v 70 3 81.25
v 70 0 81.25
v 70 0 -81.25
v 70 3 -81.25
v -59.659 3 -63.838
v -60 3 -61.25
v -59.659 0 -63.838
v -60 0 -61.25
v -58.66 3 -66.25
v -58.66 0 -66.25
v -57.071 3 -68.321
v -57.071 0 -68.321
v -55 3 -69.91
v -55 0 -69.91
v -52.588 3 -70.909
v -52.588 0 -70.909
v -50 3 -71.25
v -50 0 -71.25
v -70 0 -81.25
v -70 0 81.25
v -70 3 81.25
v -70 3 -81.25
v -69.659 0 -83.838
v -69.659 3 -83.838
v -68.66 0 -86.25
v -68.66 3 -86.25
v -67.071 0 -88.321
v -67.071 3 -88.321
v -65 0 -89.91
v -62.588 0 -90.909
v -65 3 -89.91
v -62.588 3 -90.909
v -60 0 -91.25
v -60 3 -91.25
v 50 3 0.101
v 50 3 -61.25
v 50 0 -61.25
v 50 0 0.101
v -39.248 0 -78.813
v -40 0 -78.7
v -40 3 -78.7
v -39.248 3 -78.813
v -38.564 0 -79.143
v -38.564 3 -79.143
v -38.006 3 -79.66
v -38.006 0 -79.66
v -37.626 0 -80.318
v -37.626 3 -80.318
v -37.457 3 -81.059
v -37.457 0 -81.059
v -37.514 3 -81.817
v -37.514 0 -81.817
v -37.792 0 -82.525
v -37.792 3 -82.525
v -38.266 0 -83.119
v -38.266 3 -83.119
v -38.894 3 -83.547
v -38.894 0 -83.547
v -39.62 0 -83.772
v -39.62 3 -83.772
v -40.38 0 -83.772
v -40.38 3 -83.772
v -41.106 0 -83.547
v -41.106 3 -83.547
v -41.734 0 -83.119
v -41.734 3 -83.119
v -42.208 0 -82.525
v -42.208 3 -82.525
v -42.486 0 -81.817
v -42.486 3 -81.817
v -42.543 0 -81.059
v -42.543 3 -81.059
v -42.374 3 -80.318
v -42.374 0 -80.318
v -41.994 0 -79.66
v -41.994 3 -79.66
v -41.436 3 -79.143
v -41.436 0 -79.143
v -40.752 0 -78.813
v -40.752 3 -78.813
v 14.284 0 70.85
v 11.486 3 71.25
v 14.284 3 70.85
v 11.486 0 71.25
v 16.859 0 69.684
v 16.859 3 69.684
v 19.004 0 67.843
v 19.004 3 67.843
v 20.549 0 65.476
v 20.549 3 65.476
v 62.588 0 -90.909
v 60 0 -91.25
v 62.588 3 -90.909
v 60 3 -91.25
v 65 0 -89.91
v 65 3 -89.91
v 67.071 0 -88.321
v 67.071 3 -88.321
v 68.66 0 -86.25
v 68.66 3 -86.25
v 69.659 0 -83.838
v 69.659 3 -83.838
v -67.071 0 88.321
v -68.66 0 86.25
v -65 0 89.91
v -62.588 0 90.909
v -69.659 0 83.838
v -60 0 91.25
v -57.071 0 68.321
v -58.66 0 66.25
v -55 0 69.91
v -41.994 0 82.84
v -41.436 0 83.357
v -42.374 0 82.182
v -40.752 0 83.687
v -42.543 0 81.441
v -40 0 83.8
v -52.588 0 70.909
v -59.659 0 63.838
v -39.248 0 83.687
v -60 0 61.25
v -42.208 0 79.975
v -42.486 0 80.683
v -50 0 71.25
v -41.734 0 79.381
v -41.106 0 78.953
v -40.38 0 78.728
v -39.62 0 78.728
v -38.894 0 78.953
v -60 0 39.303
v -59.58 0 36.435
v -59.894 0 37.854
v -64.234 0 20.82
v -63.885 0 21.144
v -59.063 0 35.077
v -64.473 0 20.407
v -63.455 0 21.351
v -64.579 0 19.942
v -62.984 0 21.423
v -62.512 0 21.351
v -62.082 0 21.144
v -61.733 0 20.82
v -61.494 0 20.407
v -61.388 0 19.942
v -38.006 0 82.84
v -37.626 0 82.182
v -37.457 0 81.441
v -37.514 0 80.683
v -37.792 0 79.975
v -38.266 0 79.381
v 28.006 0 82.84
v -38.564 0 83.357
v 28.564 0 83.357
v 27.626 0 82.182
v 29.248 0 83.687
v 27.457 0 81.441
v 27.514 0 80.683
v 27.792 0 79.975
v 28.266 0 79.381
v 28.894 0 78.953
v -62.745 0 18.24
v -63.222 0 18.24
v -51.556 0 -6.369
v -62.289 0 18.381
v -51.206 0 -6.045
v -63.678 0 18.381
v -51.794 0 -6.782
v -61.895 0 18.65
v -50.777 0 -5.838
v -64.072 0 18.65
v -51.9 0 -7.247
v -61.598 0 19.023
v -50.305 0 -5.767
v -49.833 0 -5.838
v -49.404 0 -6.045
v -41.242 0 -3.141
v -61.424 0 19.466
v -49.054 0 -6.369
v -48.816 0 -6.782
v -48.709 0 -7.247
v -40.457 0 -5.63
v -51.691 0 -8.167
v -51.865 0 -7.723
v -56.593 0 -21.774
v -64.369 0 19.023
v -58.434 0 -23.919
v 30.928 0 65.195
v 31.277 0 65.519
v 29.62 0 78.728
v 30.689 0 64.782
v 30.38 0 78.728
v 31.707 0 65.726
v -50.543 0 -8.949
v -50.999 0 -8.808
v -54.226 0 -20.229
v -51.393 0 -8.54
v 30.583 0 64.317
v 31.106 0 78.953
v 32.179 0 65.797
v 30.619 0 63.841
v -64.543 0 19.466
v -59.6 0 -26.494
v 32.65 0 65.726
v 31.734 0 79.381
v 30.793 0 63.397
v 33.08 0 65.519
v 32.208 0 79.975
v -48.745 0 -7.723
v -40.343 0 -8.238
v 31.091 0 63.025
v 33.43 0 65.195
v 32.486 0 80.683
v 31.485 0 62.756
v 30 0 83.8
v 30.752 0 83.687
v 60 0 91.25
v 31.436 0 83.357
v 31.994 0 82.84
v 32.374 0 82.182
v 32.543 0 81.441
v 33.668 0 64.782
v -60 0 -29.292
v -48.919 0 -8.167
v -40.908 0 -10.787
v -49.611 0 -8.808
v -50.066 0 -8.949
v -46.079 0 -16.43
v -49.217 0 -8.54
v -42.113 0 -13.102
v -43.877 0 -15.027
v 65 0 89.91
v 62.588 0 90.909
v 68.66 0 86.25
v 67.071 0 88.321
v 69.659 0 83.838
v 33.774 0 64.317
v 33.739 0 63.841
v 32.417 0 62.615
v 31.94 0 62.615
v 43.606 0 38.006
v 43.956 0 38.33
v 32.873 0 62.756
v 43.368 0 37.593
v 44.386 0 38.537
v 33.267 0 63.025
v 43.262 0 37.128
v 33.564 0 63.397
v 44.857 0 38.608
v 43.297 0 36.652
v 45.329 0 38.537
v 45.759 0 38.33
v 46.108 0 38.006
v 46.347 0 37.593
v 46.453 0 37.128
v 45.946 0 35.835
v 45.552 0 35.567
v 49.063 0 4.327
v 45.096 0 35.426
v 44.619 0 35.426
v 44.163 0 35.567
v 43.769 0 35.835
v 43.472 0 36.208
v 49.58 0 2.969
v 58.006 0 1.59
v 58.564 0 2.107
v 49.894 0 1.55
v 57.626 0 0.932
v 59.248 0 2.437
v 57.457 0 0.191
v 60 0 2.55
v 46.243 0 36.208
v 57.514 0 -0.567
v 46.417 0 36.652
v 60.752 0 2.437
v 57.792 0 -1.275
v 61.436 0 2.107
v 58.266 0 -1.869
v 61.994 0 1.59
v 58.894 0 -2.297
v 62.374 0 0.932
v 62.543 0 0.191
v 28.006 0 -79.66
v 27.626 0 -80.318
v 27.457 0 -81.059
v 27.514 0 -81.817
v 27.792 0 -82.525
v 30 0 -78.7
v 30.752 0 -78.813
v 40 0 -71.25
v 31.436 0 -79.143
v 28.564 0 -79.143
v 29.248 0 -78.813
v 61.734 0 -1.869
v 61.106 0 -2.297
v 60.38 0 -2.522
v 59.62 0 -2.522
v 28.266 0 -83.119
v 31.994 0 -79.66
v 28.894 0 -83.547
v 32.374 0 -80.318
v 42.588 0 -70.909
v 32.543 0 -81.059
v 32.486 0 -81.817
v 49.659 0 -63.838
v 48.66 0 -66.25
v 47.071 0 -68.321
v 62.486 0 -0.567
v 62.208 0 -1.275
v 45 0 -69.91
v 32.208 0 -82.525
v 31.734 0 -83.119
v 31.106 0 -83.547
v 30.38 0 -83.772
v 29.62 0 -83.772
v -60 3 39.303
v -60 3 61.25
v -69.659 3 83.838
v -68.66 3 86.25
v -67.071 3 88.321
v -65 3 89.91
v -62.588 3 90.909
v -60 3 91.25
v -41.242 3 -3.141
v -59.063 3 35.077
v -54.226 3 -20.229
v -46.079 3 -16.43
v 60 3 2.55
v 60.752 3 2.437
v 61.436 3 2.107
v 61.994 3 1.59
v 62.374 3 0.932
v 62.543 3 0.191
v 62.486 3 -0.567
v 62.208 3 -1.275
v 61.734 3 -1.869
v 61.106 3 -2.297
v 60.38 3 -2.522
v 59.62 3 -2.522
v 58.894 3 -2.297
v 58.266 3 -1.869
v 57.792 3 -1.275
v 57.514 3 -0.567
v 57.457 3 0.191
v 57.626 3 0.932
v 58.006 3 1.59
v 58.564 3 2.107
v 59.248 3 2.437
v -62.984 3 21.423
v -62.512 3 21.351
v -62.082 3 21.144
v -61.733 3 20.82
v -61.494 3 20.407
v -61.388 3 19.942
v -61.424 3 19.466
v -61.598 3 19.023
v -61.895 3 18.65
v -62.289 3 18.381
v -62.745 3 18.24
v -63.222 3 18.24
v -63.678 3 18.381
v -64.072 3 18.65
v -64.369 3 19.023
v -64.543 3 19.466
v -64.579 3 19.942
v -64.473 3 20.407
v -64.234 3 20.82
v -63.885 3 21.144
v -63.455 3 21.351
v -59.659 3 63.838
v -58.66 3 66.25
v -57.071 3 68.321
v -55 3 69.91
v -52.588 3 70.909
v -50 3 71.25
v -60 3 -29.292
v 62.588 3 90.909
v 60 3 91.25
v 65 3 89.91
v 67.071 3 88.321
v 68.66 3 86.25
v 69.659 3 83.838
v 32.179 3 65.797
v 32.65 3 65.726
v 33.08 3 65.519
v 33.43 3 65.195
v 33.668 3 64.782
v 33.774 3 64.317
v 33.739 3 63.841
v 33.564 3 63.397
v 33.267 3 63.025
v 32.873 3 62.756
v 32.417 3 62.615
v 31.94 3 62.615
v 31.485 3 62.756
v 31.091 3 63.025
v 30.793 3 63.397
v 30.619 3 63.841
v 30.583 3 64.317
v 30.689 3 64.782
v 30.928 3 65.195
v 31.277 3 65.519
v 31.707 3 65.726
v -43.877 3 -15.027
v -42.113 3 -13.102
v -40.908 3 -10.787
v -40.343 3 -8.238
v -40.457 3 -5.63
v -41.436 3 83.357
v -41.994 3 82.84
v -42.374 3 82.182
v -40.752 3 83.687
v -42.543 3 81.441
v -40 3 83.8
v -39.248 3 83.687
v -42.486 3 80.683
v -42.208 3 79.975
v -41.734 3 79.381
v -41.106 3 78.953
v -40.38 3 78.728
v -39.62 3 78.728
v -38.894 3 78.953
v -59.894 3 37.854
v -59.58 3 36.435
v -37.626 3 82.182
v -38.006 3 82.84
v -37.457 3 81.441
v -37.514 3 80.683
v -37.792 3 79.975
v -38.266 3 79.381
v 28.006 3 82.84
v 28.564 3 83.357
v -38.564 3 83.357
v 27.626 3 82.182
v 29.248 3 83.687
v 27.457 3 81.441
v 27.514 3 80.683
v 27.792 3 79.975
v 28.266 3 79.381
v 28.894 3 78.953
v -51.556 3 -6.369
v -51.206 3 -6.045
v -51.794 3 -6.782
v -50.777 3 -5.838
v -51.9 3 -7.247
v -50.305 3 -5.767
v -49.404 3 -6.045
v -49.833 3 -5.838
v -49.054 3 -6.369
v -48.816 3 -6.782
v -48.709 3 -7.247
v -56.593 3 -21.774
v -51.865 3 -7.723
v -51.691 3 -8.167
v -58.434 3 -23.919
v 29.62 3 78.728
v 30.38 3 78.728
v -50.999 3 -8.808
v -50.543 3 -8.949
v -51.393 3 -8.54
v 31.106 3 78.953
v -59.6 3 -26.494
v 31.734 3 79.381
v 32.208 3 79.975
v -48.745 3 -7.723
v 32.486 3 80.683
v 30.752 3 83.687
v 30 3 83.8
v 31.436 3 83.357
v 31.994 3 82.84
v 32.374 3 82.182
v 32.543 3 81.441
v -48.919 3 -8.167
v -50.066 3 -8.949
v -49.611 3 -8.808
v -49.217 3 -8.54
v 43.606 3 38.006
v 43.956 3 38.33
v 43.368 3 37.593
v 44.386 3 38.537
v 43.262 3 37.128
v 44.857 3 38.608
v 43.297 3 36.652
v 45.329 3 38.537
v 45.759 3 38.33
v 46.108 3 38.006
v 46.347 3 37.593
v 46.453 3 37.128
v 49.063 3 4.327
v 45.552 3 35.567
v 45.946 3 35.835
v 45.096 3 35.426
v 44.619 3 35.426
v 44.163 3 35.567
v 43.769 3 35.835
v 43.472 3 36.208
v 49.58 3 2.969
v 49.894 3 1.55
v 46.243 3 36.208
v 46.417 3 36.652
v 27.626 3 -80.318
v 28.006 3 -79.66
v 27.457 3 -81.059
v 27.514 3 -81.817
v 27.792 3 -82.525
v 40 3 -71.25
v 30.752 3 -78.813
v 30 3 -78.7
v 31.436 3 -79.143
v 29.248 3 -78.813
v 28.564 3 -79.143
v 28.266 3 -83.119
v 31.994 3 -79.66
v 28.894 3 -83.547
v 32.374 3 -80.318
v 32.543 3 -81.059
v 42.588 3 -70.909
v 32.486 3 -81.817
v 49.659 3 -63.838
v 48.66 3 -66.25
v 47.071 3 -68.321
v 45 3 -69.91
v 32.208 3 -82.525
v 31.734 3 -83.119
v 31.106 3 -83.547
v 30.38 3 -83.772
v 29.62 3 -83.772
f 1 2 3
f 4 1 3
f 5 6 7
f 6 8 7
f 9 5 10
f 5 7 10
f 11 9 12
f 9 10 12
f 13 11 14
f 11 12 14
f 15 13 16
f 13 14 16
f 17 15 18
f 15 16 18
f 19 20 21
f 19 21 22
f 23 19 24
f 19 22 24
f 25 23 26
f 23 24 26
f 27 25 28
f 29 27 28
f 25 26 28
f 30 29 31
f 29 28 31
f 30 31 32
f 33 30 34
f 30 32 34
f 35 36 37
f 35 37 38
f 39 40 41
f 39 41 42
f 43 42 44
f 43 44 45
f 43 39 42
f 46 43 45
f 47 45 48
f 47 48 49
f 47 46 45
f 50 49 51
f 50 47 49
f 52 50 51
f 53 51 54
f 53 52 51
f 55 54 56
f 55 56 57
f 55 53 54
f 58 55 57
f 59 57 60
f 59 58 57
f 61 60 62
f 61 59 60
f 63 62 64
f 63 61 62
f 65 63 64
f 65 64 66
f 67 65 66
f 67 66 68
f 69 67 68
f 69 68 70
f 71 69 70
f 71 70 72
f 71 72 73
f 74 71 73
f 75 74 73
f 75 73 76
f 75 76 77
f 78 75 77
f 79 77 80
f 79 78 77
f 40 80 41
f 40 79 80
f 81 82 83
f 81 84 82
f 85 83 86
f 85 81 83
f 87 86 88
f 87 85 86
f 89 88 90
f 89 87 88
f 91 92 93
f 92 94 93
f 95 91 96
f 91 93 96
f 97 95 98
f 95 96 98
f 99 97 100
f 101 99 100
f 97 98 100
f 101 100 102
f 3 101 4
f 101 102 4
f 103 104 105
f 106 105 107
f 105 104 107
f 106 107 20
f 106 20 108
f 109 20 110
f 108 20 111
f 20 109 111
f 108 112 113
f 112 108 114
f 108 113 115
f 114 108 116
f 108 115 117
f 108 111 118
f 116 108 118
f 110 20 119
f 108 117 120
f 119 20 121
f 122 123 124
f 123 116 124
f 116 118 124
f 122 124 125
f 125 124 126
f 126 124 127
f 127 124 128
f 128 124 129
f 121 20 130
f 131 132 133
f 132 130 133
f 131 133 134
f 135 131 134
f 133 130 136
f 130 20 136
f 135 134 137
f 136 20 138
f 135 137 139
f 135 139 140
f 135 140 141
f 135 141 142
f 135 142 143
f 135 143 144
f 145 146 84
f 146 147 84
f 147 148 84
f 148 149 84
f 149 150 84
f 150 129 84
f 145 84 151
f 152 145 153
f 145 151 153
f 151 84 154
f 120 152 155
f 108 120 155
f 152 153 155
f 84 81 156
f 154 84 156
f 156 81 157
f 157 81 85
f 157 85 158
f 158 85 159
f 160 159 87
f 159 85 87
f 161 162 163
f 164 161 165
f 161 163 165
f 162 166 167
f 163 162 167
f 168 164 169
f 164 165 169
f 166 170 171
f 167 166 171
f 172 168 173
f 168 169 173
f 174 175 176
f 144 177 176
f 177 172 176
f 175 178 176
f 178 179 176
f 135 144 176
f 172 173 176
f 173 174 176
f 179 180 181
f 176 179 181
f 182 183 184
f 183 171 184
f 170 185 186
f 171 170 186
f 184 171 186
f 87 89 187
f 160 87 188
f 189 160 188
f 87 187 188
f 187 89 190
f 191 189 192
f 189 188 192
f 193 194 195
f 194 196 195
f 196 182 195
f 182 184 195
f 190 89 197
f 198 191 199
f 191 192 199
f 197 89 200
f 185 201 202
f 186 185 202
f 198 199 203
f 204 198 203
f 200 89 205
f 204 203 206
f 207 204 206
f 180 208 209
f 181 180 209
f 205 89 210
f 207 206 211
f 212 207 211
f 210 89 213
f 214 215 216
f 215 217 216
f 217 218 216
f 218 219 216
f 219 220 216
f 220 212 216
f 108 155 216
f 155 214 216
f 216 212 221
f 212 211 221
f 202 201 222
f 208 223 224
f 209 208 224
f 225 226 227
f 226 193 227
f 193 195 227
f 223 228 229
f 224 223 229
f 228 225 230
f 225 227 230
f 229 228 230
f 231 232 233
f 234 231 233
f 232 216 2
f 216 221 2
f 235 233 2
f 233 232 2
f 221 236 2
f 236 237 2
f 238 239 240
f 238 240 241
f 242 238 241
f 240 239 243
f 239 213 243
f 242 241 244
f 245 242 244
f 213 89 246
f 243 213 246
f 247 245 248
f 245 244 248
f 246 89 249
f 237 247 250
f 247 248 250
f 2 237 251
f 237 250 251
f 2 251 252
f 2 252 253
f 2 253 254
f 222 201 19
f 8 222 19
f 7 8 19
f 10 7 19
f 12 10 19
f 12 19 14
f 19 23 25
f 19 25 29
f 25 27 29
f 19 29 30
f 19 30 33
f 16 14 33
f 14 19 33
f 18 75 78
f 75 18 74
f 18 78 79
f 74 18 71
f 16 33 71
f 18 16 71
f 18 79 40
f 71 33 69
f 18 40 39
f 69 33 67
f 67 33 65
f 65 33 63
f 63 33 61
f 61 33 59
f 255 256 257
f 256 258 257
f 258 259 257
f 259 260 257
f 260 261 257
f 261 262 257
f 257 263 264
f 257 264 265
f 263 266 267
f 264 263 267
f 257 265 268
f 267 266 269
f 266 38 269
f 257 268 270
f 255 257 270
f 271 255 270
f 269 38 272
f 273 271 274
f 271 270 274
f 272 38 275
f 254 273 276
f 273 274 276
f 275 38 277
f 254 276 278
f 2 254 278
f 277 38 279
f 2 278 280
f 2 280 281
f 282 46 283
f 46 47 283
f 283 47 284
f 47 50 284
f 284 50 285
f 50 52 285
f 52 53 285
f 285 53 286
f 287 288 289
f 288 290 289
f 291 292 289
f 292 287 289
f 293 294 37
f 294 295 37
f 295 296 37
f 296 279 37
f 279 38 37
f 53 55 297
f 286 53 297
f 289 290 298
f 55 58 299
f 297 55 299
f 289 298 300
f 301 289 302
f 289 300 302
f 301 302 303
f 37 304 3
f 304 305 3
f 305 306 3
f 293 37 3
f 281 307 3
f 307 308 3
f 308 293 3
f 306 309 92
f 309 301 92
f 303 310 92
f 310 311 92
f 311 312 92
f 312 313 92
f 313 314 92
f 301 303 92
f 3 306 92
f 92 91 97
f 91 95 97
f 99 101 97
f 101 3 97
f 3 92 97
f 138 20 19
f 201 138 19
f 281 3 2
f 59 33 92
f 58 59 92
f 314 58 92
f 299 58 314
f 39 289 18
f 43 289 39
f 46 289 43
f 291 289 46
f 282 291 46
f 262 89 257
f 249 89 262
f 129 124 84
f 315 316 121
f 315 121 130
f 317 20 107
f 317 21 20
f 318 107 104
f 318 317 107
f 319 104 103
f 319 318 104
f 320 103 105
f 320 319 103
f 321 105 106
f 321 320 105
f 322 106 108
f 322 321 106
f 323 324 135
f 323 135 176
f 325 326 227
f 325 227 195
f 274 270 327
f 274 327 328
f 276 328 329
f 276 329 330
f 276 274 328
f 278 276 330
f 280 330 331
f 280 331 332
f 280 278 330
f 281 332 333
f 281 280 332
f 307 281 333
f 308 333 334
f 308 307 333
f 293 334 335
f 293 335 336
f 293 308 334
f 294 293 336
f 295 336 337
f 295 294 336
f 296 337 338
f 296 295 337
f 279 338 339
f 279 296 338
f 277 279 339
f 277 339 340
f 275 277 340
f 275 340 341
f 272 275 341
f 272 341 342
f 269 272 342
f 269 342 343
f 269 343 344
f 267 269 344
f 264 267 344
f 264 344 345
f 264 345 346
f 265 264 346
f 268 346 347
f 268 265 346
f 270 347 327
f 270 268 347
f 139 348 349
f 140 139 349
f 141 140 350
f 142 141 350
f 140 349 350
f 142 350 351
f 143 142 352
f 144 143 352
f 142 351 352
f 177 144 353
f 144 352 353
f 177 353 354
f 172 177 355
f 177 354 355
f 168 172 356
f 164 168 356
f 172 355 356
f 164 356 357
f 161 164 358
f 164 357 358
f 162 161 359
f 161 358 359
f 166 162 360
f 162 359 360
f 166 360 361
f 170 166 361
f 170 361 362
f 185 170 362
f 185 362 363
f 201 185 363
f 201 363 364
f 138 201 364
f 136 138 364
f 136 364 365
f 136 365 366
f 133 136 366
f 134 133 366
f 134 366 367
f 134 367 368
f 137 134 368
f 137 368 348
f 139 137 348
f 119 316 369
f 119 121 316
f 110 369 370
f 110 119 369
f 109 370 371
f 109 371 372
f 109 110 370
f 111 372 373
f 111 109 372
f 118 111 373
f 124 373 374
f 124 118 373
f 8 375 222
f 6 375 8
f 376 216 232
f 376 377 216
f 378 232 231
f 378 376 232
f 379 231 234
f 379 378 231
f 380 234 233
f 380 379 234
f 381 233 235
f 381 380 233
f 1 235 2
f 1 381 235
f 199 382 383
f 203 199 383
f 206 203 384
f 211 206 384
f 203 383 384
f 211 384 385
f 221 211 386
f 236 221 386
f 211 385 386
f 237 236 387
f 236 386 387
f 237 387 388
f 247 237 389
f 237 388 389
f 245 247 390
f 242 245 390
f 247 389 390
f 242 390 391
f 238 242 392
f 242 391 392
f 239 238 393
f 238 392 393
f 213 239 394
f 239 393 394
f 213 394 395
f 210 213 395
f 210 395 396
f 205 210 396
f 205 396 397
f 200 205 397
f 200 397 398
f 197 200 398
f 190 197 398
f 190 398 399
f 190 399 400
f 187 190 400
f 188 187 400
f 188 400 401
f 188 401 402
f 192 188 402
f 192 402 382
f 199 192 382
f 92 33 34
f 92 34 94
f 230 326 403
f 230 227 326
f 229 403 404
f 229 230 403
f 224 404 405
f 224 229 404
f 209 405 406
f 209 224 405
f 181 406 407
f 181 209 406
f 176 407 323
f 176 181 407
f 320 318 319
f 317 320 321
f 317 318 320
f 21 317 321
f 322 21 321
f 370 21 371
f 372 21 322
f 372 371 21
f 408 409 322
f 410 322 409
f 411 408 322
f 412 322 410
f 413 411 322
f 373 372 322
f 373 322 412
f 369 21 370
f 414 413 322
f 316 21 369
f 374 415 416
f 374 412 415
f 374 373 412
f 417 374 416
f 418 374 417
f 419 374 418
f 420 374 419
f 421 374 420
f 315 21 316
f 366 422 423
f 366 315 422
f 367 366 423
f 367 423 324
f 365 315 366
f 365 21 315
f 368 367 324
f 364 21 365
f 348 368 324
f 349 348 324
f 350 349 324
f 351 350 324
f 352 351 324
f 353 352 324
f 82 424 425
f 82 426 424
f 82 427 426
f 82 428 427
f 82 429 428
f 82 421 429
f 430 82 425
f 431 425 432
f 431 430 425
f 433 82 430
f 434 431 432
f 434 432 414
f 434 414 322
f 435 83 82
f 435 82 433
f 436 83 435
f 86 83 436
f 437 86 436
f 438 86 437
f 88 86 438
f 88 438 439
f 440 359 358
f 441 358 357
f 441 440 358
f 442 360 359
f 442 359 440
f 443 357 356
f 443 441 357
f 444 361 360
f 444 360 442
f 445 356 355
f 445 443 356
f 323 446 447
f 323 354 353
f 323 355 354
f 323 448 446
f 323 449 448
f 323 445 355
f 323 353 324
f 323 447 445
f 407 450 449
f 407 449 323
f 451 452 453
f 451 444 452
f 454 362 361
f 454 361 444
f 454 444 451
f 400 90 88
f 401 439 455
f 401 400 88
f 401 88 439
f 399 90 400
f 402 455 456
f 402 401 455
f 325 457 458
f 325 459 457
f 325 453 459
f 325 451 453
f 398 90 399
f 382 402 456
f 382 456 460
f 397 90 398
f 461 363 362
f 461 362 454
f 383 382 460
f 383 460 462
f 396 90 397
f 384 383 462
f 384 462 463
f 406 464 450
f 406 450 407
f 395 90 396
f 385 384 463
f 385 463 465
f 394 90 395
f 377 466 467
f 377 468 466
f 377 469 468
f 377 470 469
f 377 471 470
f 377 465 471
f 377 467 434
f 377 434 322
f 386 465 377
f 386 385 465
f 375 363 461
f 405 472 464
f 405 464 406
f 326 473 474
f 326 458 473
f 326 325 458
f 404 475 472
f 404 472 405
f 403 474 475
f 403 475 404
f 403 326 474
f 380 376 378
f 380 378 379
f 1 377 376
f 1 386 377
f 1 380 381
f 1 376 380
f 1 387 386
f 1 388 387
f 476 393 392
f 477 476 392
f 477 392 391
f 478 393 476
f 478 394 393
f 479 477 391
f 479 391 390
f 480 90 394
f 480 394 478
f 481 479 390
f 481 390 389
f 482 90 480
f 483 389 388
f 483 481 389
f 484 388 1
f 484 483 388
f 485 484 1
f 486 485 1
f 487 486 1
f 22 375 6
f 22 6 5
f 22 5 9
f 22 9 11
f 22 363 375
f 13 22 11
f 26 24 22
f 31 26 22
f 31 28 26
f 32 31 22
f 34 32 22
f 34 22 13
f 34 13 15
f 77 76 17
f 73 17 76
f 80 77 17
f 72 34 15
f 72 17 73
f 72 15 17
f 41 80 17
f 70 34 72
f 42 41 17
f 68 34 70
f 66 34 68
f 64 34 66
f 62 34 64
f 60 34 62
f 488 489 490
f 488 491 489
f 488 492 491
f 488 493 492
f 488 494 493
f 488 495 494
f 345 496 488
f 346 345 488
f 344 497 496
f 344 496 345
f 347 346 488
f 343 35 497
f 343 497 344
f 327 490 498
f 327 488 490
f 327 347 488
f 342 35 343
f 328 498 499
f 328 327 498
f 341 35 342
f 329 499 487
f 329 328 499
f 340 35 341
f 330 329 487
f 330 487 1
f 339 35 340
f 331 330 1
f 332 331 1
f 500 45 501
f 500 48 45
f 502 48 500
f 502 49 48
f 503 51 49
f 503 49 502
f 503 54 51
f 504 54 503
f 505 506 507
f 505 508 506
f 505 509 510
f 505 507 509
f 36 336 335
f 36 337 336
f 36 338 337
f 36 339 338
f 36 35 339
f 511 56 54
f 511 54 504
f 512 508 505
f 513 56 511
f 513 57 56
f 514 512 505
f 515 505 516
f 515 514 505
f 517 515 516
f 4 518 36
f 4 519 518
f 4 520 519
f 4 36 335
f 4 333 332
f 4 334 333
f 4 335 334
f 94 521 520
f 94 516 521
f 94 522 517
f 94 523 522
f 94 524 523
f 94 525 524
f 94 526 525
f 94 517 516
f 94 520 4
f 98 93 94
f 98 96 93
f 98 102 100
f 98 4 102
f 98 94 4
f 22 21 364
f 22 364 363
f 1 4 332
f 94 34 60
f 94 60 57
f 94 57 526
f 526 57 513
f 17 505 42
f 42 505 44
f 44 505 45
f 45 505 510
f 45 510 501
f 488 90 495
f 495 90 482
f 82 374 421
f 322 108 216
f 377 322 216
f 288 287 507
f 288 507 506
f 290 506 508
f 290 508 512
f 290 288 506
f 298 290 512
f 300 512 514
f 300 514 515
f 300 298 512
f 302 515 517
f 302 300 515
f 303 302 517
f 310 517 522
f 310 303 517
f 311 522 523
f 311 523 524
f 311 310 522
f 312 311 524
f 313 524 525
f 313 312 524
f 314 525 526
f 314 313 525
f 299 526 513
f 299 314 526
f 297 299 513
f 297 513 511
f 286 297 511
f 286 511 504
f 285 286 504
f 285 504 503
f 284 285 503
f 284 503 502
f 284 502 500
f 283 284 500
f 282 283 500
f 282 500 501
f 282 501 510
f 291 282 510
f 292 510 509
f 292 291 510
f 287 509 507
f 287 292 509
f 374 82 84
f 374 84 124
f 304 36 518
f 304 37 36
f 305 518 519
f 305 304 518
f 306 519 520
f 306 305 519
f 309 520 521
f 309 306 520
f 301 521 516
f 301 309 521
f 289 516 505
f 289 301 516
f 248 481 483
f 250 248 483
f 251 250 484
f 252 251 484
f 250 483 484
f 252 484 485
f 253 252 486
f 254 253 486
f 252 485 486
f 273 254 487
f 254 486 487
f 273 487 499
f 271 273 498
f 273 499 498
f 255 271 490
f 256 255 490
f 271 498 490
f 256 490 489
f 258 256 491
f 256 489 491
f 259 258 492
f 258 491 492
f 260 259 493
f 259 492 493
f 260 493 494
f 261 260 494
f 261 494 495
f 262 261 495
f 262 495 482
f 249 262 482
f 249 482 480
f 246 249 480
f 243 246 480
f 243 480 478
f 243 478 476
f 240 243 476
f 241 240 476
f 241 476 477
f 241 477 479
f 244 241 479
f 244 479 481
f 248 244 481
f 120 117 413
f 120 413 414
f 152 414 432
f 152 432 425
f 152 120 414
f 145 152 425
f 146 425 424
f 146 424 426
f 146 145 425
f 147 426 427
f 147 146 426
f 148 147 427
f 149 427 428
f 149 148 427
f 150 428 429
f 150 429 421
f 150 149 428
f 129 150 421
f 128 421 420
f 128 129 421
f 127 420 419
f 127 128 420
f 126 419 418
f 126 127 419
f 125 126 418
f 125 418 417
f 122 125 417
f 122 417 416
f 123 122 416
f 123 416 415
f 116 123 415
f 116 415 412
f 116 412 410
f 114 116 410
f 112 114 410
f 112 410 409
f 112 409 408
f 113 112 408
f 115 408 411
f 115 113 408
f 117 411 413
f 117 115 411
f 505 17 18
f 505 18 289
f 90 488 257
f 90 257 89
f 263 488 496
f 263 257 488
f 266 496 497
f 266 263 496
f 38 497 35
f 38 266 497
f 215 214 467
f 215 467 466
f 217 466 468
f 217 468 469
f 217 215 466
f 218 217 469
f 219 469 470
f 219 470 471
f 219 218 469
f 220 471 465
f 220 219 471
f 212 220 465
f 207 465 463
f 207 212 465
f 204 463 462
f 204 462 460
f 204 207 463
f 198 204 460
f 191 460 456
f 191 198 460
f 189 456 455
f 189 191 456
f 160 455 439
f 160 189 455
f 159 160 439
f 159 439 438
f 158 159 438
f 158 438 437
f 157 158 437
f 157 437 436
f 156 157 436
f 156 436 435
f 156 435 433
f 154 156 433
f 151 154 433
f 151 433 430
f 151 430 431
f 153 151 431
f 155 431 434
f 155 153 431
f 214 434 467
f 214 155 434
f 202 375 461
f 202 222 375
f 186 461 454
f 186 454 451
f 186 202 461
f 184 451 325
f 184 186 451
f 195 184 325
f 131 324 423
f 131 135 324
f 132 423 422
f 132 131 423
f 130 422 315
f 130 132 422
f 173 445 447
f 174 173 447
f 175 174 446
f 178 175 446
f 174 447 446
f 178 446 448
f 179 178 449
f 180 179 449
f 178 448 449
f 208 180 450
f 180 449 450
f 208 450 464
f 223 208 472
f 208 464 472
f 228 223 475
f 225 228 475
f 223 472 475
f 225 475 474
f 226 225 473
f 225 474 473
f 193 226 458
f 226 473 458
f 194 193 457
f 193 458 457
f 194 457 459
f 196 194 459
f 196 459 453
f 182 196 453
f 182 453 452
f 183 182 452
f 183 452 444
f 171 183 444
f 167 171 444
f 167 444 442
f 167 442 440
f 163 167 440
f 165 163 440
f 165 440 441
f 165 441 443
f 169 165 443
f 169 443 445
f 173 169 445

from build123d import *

# Parameters (mm, degrees)
SKETCH_1_W          = 140
SKETCH_1_H          = 182.5
SKETCH_1_R          = 2.55
EXTRUDE_1_DEPTH     = 3
FILLET_1_R          = 10
SKETCH_2_R          = 1.6
CUT_EXTRUDE_1_DEPTH = 116.045914747
CUT_EXTRUDE_2_DEPTH = 116.045914747
FILLET_2_R          = 10


with BuildPart() as part:
    # ｽｹｯﾁ1 → ﾎﾞｽ - 押し出し1 (new body)
    with BuildSketch(Plane(origin=(0, 0, 0), x_dir=(1, 0, 0), z_dir=(0, 1, 0))):
        Rectangle(SKETCH_1_W, SKETCH_1_H)
        with Locations(Location((-40, 81.25, 0), (0, 0, 270))):
            Circle(SKETCH_1_R, mode=Mode.SUBTRACT)
        with Locations(Location((30, 81.25, 0), (0, 0, 270))):
            Circle(SKETCH_1_R, mode=Mode.SUBTRACT)
        with Locations(Location((60, 0, 0), (0, 0, 270))):
            Circle(SKETCH_1_R, mode=Mode.SUBTRACT)
        with Locations(Location((-40, -81.25, 0), (0, 0, 270))):
            Circle(SKETCH_1_R, mode=Mode.SUBTRACT)
        with Locations(Location((30, -81.25, 0), (0, 0, 270))):
            Circle(SKETCH_1_R, mode=Mode.SUBTRACT)
    extrude(amount=EXTRUDE_1_DEPTH)

    # ﾌｨﾚｯﾄ1
    fillet_1_edges = [part.edges().sort_by_distance(p)[0] for p in [
        (70, 1.5, 91.25),
        (-70, 1.5, 91.25),
        (-70, 1.5, -91.25),
        (70, 1.5, -91.25),
    ]]
    fillet(fillet_1_edges, radius=FILLET_1_R)

    # ｽｹｯﾁ2 → ｶｯﾄ - 押し出し1 (cut, through all)
    with BuildSketch(Plane(origin=(0, 3, 0), x_dir=(1, 0, 0), z_dir=(0, 1, 0))):
        with Locations(Location((-50.304962764, 7.366722093, 0), (0, 0, 270))):
            Circle(SKETCH_2_R)
        with Locations(Location((-62.983510616, -19.822511518, 0), (0, 0, 270))):
            Circle(SKETCH_2_R)
        with Locations(Location((44.857354875, -37.008195389, 0), (0, 0, 270))):
            Circle(SKETCH_2_R)
        with Locations(Location((32.178807023, -64.197429, 0), (0, 0, 270))):
            Circle(SKETCH_2_R)
    extrude(amount=-CUT_EXTRUDE_1_DEPTH, mode=Mode.SUBTRACT)

    # ｽｹｯﾁ3 → ｶｯﾄ - 押し出し2 (cut, through all)
    with BuildSketch(Plane(origin=(0, 3, 0), x_dir=(1, 0, 0), z_dir=(0, 1, 0))):
        Polygon((-60, 71.25), (50, 71.25), (50, -2.317741498), (17.856359967, -71.25), (-60, -71.25), (-60, -37.086368186), (-37.015702276, 12.203617346), (-60, 22.921371393), align=None)
    extrude(amount=-CUT_EXTRUDE_2_DEPTH, mode=Mode.SUBTRACT)

    # ﾌｨﾚｯﾄ2
    fillet_2_edges = [part.edges().sort_by_distance(p)[0] for p in [
        (-60, 1.5, -22.921371393),
        (-60, 1.5, -71.25),
        (50, 1.5, -71.25),
        (50, 1.5, 2.317741498),
        (17.856359967, 1.5, 71.25),
        (-60, 1.5, 71.25),
        (-60, 1.5, 37.086368186),
        (-37.015702276, 1.5, -12.203617346),
    ]]
    fillet(fillet_2_edges, radius=FILLET_2_R)


solid = part.part
